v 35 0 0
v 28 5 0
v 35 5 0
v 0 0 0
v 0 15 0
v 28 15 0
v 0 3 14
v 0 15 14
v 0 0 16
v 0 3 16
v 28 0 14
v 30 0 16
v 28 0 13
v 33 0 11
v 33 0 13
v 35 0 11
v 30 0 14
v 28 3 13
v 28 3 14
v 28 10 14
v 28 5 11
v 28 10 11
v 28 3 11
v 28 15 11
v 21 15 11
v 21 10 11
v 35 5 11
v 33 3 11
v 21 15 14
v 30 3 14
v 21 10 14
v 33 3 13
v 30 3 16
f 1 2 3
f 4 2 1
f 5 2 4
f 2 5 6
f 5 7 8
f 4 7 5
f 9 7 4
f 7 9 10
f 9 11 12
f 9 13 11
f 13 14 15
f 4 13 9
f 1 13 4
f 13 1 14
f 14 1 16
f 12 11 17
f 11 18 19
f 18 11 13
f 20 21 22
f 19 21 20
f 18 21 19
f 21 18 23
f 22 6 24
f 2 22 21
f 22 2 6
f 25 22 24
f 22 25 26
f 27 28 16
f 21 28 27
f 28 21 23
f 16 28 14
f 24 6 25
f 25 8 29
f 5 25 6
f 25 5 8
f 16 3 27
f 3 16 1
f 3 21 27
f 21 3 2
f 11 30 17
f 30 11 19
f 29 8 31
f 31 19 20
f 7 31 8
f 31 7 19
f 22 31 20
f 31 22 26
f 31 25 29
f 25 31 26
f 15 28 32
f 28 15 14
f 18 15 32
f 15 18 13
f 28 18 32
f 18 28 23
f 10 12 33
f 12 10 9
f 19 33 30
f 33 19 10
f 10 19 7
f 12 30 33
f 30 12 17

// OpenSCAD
translate([3.5, 2.5, 5.5]) color([0.9788025142917065, 0.3011589686960586, 0.6091605287508749]) cube([7, 5, 11], center=true);
translate([10.5, 2.5, 5.5]) color([0.4242090709976407, 0.7513524999576429, 0.09255304692818778]) cube([7, 5, 11], center=true);
translate([17.5, 2.5, 5.5]) color([0.4976795968420046, 0.9609180855182016, 0.5437408220916614]) cube([7, 5, 11], center=true);
translate([24.5, 2.5, 5.5]) color([0.405305104554358, 0.6320656015278037, 0.0216193804206819]) cube([7, 5, 11], center=true);
translate([3.5, 7.5, 5.5]) color([0.2700784048715086, 0.6684886667173141, 0.0002532098932251925]) cube([7, 5, 11], center=true);
translate([10.5, 7.5, 5.5]) color([0.3984286079265319, 0.8905618085087551, 0.7099647178965433]) cube([7, 5, 11], center=true);
translate([17.5, 7.5, 5.5]) color([0.4445845492335537, 0.7465509493098265, 0.35382203223851694]) cube([7, 5, 11], center=true);
translate([24.5, 7.5, 5.5]) color([0.8712980207444939, 0.6725473918674463, 0.19603088941730495]) cube([7, 5, 11], center=true);
translate([3.5, 12.5, 5.5]) color([0.08525923665948931, 0.0704556688087915, 0.26248678792717994]) cube([7, 5, 11], center=true);
translate([10.5, 12.5, 5.5]) color([0.533638651221174, 0.11818482376773232, 0.8594532404023933]) cube([7, 5, 11], center=true);
translate([17.5, 12.5, 5.5]) color([0.8906989166138923, 0.7620005545284954, 0.06809296768032302]) cube([7, 5, 11], center=true);
translate([24.5, 12.5, 5.5]) color([0.8609410769469436, 0.2827478909480132, 0.13442052583382869]) cube([7, 5, 11], center=true);
translate([31.5, 2.5, 5.5]) color([0.5230599837537087, 0.21027834364306774, 0.10530639745894443]) cube([7, 5, 11], center=true);
translate([3.5, 2.5, 12.5]) color([0.9556548717215211, 0.5435731515542631, 0.7414270622920264]) cube([7, 5, 3], center=true);
translate([10.5, 2.5, 12.5]) color([0.9040457292510377, 0.2786145977098805, 0.4423646135017597]) cube([7, 5, 3], center=true);
translate([17.5, 2.5, 12.5]) color([0.5682329433322765, 0.13781274972163116, 0.1232982180791492]) cube([7, 5, 3], center=true);
translate([24.5, 2.5, 12.5]) color([0.12051785276403837, 0.4012165411640888, 0.4679428423906348]) cube([7, 5, 3], center=true);
translate([3.5, 7.5, 12.5]) color([0.5596131508667647, 0.29896126951320356, 0.6321114709426877]) cube([7, 5, 3], center=true);
translate([10.5, 7.5, 12.5]) color([0.7423454703026071, 0.21800995973285464, 0.48885816108208613]) cube([7, 5, 3], center=true);
translate([17.5, 7.5, 12.5]) color([0.501567157493831, 0.49271975198428686, 0.958422556968198]) cube([7, 5, 3], center=true);
translate([24.5, 7.5, 12.5]) color([0.44398175403613704, 0.14281143058247625, 0.4955231327742775]) cube([7, 5, 3], center=true);
translate([3.5, 12.5, 12.5]) color([0.8873352305676206, 0.21571394075115613, 0.3554013630116646]) cube([7, 5, 3], center=true);
translate([10.5, 12.5, 12.5]) color([0.39096604949642, 0.9928835035123682, 0.8462248334797323]) cube([7, 5, 3], center=true);
translate([17.5, 12.5, 12.5]) color([0.9789066021625461, 0.6868956228130294, 0.08137290691060206]) cube([7, 5, 3], center=true);
translate([30.5, 1.5, 12.0]) color([0.9493092651810784, 0.9246190463677613, 0.3951154575230438]) cube([5, 3, 2], center=true);
translate([2.5, 1.5, 15.0]) color([0.3612783181755085, 0.11615210489091876, 0.0037403702712440756]) cube([5, 3, 2], center=true);
translate([7.5, 1.5, 15.0]) color([0.2703277384724262, 0.6403732426441148, 0.29252642189785794]) cube([5, 3, 2], center=true);
translate([12.5, 1.5, 15.0]) color([0.9007258804640697, 0.14067978971908934, 0.5728503338092871]) cube([5, 3, 2], center=true);
translate([17.5, 1.5, 15.0]) color([0.1912043400515635, 0.43401891336511733, 0.7163457448050065]) cube([5, 3, 2], center=true);
translate([22.5, 1.5, 15.0]) color([0.3841301513333275, 0.33069552050314754, 0.6480049557775331]) cube([5, 3, 2], center=true);
translate([27.5, 1.5, 15.0]) color([0.6874717059379091, 0.14801928734251768, 0.93323205939552]) cube([5, 3, 2], center=true);
